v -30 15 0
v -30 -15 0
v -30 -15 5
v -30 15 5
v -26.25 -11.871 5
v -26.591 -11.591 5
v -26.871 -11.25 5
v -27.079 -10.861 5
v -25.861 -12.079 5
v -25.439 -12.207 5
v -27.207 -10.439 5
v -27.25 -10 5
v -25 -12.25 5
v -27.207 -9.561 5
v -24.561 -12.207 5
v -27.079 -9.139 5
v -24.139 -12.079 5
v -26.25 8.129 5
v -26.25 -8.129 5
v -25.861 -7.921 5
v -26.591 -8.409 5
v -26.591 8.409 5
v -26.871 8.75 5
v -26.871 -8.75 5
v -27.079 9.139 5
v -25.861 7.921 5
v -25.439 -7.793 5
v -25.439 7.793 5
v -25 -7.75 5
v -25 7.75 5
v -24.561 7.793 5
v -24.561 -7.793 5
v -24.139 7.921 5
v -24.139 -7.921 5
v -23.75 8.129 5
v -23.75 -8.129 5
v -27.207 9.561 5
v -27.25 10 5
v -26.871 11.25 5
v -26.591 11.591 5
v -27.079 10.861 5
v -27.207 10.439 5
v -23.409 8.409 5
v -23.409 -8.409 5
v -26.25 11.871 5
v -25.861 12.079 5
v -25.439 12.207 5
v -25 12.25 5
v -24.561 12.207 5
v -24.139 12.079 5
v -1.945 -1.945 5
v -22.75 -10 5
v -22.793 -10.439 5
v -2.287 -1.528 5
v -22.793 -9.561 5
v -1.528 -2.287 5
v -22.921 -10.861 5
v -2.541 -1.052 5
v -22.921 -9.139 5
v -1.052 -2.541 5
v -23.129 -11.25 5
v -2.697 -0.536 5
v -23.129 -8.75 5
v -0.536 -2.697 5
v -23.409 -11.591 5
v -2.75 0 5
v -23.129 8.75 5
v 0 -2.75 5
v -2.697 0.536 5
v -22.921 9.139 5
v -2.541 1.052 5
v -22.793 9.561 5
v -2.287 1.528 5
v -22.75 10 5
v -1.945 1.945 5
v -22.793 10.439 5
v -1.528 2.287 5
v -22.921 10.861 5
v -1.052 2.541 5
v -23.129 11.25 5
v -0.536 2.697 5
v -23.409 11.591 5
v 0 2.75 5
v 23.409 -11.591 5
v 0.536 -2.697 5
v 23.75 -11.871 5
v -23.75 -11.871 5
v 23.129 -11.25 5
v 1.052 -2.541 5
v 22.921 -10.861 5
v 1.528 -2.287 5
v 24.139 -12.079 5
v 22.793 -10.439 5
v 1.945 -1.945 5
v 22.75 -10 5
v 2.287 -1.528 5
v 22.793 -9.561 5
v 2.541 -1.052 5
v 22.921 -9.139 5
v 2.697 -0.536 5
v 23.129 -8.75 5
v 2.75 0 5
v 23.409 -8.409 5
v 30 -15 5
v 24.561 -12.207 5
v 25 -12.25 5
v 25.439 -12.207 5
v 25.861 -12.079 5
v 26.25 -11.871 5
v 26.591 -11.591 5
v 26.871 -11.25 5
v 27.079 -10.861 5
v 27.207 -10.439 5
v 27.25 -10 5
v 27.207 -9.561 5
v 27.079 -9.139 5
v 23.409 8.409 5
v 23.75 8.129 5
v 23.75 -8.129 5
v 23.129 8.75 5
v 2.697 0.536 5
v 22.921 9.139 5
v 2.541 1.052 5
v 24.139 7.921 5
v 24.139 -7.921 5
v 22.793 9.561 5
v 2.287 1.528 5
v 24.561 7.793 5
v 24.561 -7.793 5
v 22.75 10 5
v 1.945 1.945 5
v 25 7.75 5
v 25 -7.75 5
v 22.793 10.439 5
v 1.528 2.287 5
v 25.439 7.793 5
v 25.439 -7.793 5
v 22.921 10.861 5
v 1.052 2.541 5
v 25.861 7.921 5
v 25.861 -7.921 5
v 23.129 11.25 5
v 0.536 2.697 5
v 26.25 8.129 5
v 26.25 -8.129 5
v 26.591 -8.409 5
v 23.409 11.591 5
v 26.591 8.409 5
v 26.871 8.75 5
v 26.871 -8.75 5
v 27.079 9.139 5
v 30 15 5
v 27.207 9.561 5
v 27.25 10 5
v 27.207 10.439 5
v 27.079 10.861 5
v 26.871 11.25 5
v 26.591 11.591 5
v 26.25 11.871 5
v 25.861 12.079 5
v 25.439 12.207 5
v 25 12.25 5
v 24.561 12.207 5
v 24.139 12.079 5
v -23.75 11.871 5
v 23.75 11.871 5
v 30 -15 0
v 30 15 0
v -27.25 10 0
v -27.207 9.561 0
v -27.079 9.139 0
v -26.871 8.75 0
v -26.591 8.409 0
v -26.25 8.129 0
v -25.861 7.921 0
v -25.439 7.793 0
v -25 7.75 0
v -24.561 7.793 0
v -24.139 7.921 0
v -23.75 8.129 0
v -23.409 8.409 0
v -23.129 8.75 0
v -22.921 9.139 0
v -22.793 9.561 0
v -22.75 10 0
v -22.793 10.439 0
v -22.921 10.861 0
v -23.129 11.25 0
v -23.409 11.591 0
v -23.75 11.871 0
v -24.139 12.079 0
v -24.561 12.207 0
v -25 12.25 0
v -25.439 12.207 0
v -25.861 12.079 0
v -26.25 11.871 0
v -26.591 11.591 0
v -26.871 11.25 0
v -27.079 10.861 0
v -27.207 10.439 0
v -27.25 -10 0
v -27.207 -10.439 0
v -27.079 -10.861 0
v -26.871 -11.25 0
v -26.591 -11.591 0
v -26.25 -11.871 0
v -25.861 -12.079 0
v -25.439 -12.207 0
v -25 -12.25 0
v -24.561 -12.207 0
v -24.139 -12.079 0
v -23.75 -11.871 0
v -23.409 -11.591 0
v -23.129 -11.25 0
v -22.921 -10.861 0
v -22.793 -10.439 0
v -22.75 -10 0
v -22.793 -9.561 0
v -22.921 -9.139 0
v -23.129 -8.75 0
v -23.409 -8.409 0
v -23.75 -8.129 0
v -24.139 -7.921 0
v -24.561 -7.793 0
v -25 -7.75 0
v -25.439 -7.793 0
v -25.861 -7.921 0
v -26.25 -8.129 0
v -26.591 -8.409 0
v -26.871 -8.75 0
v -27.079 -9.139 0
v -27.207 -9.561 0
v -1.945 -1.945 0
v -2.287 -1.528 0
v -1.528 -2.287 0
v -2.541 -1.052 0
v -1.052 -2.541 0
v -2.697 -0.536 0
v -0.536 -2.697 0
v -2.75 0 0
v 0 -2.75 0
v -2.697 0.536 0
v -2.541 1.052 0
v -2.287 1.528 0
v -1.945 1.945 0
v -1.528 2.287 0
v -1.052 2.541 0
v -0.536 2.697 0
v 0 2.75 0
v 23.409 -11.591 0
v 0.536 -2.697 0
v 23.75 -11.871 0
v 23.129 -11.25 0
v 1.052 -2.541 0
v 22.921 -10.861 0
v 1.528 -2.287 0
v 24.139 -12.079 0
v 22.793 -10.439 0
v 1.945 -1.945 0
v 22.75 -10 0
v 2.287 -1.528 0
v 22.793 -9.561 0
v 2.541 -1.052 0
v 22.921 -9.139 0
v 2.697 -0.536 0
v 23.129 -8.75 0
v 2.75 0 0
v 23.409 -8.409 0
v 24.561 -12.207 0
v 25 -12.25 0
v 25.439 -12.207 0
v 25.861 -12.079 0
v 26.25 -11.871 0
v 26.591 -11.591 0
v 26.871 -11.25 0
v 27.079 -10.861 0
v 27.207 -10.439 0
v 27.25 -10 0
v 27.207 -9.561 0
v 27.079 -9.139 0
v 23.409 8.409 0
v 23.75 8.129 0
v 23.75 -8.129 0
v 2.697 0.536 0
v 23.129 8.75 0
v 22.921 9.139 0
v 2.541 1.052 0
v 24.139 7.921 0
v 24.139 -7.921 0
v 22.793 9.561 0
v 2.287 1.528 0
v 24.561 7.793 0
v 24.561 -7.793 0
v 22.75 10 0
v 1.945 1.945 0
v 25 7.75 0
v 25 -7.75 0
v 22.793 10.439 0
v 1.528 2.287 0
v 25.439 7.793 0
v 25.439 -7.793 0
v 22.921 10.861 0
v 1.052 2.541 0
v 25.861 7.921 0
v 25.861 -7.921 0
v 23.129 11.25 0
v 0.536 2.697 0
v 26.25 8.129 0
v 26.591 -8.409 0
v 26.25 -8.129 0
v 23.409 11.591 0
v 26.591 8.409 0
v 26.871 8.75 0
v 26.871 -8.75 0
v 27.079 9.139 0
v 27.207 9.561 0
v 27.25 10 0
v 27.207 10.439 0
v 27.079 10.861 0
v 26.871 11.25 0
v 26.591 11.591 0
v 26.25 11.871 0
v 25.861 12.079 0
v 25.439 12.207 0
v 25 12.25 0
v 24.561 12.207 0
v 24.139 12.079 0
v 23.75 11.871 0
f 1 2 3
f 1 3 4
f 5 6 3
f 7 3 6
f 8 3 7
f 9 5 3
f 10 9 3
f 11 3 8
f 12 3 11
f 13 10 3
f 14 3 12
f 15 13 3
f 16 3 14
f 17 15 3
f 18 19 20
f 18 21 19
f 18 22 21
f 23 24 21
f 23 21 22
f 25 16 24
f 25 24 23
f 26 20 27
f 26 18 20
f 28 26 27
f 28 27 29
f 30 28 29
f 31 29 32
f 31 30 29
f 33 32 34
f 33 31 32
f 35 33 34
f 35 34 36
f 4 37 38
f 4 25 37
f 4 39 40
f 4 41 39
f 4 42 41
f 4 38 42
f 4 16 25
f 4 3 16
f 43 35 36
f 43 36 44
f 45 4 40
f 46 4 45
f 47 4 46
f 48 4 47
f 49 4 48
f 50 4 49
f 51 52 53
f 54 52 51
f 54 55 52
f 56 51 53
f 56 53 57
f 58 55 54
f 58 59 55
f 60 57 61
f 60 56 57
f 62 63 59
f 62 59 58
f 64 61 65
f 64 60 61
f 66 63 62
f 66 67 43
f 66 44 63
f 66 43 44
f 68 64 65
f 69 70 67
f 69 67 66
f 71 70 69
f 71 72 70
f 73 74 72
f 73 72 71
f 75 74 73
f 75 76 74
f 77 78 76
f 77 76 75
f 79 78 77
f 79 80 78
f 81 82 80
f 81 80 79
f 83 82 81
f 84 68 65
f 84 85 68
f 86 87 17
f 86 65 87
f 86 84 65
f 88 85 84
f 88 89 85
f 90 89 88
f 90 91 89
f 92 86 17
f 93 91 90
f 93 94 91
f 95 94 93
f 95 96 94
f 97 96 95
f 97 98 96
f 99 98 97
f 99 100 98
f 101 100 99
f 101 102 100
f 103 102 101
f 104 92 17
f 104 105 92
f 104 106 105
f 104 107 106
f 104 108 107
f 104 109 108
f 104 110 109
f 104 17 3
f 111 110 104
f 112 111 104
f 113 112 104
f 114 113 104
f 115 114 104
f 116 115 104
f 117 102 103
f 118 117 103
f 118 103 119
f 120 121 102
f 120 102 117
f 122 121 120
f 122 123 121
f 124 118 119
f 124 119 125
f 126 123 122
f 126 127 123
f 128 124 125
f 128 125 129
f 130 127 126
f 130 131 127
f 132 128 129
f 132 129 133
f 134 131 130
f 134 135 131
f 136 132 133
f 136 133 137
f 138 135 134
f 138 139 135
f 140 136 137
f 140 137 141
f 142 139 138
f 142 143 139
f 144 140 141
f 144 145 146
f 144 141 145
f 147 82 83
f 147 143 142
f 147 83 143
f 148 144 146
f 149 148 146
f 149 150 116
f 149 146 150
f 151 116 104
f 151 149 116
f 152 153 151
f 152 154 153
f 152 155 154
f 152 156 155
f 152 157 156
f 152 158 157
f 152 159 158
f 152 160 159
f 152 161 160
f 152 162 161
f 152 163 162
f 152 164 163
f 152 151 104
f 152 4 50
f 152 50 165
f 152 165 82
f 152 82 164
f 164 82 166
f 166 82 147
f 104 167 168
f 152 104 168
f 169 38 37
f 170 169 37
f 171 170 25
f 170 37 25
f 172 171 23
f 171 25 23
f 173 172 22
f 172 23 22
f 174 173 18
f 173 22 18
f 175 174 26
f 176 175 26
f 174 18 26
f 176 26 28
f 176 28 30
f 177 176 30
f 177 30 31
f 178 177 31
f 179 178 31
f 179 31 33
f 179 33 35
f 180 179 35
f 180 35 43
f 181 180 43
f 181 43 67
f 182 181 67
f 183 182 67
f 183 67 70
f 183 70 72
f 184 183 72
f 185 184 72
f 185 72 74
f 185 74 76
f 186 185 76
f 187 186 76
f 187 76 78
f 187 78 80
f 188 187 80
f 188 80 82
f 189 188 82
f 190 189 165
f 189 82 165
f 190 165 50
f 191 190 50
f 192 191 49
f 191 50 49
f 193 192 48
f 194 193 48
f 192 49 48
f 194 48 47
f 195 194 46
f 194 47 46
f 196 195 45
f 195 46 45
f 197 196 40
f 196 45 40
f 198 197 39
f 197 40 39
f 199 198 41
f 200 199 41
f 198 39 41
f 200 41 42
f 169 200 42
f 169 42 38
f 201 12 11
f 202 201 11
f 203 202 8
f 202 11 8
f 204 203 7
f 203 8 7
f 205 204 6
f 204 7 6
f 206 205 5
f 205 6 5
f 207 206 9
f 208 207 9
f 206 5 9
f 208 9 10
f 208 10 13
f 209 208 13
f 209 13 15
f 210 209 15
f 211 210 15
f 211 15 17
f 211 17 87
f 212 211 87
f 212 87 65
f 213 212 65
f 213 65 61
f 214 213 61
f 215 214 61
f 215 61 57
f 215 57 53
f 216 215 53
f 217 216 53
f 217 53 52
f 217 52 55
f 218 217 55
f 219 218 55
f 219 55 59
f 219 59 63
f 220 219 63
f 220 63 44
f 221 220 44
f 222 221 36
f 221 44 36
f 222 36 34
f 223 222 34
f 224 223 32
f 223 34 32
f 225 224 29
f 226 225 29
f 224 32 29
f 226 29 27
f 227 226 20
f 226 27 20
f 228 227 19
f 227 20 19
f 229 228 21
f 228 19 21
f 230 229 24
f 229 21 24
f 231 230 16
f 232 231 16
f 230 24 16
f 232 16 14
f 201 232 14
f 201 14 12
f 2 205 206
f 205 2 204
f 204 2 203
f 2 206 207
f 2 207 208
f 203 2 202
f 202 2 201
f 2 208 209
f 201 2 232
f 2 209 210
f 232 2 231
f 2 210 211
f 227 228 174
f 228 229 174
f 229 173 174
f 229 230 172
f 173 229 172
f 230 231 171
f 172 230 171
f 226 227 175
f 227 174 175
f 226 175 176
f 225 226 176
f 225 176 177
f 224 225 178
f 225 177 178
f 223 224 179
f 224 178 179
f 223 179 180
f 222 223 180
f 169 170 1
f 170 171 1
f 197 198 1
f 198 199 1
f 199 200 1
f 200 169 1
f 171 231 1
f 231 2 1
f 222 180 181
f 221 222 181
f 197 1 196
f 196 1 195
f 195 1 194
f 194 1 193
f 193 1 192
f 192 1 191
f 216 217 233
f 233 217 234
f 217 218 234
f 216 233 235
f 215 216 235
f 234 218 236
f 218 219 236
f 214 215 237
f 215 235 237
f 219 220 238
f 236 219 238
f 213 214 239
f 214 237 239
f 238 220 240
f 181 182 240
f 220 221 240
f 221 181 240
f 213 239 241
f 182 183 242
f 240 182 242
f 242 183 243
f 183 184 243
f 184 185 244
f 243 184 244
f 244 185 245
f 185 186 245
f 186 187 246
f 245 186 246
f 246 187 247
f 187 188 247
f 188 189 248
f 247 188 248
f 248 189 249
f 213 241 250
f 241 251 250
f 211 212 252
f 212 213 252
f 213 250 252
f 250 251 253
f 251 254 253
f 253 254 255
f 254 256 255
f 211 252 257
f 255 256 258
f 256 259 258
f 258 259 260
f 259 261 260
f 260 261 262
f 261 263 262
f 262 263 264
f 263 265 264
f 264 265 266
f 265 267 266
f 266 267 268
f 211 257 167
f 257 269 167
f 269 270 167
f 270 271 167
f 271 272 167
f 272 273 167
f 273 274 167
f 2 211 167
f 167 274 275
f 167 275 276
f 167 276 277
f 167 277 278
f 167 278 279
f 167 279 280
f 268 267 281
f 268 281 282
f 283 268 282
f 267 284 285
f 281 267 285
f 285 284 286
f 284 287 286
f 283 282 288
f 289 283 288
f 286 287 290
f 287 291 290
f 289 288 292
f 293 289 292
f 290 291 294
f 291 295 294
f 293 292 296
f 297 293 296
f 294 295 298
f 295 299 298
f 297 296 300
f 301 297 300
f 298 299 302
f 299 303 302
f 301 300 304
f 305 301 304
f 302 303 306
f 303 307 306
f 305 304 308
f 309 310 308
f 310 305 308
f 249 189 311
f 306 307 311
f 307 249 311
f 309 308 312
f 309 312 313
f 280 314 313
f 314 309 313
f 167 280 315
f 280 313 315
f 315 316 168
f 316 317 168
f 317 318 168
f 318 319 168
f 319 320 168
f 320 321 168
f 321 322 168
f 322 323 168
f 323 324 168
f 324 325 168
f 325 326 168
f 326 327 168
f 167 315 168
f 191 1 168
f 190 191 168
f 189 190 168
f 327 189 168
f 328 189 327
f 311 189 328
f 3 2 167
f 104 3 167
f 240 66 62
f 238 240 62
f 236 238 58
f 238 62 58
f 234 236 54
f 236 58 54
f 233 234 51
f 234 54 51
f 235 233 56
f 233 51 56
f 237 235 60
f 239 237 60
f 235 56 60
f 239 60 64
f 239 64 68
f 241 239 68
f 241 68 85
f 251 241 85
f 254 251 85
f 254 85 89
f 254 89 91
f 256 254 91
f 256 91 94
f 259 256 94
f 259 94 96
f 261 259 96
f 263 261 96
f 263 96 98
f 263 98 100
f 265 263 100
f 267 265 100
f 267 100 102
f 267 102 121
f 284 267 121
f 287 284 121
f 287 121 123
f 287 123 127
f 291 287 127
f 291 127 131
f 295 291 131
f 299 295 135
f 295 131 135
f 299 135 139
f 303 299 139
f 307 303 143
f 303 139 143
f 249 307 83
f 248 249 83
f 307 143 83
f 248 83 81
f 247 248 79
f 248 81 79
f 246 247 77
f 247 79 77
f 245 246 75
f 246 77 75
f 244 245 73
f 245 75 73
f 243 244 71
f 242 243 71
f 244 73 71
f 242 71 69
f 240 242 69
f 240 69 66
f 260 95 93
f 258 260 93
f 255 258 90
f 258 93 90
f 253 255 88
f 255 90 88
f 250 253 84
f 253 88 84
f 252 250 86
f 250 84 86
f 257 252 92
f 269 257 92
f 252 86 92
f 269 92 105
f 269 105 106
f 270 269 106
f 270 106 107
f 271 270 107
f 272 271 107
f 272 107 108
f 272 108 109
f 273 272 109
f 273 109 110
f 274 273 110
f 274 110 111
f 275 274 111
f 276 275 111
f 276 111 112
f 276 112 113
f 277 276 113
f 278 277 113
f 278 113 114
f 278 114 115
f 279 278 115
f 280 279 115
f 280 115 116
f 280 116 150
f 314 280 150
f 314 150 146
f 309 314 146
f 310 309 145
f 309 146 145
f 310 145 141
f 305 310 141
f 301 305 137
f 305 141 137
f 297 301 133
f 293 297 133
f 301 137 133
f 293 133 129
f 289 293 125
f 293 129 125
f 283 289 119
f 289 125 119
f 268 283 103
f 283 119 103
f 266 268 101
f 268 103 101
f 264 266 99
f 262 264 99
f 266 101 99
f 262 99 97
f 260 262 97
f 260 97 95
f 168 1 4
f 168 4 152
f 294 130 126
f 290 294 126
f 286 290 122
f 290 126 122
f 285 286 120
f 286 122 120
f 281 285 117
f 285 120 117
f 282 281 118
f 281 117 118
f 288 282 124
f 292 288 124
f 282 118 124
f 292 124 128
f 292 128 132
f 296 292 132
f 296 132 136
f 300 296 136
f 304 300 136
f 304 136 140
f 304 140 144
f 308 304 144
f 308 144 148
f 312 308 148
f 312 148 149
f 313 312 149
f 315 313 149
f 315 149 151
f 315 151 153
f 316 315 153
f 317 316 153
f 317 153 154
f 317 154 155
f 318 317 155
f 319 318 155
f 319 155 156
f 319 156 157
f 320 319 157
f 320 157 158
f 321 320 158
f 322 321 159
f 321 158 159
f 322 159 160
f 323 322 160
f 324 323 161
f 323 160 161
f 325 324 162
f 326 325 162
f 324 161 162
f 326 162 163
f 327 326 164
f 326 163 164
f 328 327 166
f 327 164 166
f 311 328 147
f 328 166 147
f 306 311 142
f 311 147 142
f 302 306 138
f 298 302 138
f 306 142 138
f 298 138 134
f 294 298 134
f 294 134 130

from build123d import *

# Parameters (mm, degrees)
F0_W     = 60
F0_H     = 30
F0_R     = 2.3276223463
F0_R_2   = 2.3015247155
F0_R_3   = 2.1862089509
F0_R_4   = 12
F0_R_5   = 1.5601782255
F1_DEPTH = 5
F2_D     = 4.5
F3_D     = 5.5


with BuildPart() as f1:
    # F0 (on Top) → F1 (new body)
    with BuildSketch(Plane.XY):
        Rectangle(F0_W, F0_H)
        with Locations((-25, -10)):
            Circle(F0_R, mode=Mode.SUBTRACT)
        with Locations((25, -10)):
            Circle(F0_R_2, mode=Mode.SUBTRACT)
        with Locations((-25, 10)):
            Circle(F0_R_3, mode=Mode.SUBTRACT)
        Circle(F0_R_4, mode=Mode.SUBTRACT)
        with Locations((25, 10)):
            Circle(F0_R_5, mode=Mode.SUBTRACT)
        Circle(F0_R_4)
        with BuildLine():
            ThreePointArc((-2.5620431112, -6.5142869983), (0.0664242114, 6.9996848375), (2.4379568888, -6.5617349999))
            Line((2.4379568888, -6.5617349999), (2.4379568888, -9.5))
            Line((2.4379568888, -9.5), (-2.5620431112, -9.5))
            Line((-2.5620431112, -9.5), (-2.5620431112, -6.5142869983))
        make_face(mode=Mode.SUBTRACT)
        with BuildLine():
            Line((2.4379568888, -9.5), (2.4379568888, -6.5617349999))
            ThreePointArc((2.4379568888, -6.5617349999), (0.0664242114, 6.9996848375), (-2.5620431112, -6.5142869983))
            Line((-2.5620431112, -6.5142869983), (-2.5620431112, -9.5))
            Line((-2.5620431112, -9.5), (2.4379568888, -9.5))
        make_face()
        with Locations((-25, -10)):
            Circle(F0_R)
        with Locations((25, -10)):
            Circle(F0_R_2)
        with Locations((-25, 10)):
            Circle(F0_R_3)
        with Locations((25, 10)):
            Circle(F0_R_5)
    extrude(amount=F1_DEPTH)

    # F2 (through all)
    with Locations(Plane(origin=(0, 0, 0), x_dir=(1, 0, 0), z_dir=(0, 0, -1))):
        with Locations((25, -10), (-25, -10), (-25, 10), (25, 10)):
            Hole(F2_D / 2)

    # F3 (through all)
    with Locations(Plane(origin=(0, 0, 0), x_dir=(1, 0, 0), z_dir=(0, 0, -1))):
        with Locations((0, 0)):
            Hole(F3_D / 2)


solid = f1.part
